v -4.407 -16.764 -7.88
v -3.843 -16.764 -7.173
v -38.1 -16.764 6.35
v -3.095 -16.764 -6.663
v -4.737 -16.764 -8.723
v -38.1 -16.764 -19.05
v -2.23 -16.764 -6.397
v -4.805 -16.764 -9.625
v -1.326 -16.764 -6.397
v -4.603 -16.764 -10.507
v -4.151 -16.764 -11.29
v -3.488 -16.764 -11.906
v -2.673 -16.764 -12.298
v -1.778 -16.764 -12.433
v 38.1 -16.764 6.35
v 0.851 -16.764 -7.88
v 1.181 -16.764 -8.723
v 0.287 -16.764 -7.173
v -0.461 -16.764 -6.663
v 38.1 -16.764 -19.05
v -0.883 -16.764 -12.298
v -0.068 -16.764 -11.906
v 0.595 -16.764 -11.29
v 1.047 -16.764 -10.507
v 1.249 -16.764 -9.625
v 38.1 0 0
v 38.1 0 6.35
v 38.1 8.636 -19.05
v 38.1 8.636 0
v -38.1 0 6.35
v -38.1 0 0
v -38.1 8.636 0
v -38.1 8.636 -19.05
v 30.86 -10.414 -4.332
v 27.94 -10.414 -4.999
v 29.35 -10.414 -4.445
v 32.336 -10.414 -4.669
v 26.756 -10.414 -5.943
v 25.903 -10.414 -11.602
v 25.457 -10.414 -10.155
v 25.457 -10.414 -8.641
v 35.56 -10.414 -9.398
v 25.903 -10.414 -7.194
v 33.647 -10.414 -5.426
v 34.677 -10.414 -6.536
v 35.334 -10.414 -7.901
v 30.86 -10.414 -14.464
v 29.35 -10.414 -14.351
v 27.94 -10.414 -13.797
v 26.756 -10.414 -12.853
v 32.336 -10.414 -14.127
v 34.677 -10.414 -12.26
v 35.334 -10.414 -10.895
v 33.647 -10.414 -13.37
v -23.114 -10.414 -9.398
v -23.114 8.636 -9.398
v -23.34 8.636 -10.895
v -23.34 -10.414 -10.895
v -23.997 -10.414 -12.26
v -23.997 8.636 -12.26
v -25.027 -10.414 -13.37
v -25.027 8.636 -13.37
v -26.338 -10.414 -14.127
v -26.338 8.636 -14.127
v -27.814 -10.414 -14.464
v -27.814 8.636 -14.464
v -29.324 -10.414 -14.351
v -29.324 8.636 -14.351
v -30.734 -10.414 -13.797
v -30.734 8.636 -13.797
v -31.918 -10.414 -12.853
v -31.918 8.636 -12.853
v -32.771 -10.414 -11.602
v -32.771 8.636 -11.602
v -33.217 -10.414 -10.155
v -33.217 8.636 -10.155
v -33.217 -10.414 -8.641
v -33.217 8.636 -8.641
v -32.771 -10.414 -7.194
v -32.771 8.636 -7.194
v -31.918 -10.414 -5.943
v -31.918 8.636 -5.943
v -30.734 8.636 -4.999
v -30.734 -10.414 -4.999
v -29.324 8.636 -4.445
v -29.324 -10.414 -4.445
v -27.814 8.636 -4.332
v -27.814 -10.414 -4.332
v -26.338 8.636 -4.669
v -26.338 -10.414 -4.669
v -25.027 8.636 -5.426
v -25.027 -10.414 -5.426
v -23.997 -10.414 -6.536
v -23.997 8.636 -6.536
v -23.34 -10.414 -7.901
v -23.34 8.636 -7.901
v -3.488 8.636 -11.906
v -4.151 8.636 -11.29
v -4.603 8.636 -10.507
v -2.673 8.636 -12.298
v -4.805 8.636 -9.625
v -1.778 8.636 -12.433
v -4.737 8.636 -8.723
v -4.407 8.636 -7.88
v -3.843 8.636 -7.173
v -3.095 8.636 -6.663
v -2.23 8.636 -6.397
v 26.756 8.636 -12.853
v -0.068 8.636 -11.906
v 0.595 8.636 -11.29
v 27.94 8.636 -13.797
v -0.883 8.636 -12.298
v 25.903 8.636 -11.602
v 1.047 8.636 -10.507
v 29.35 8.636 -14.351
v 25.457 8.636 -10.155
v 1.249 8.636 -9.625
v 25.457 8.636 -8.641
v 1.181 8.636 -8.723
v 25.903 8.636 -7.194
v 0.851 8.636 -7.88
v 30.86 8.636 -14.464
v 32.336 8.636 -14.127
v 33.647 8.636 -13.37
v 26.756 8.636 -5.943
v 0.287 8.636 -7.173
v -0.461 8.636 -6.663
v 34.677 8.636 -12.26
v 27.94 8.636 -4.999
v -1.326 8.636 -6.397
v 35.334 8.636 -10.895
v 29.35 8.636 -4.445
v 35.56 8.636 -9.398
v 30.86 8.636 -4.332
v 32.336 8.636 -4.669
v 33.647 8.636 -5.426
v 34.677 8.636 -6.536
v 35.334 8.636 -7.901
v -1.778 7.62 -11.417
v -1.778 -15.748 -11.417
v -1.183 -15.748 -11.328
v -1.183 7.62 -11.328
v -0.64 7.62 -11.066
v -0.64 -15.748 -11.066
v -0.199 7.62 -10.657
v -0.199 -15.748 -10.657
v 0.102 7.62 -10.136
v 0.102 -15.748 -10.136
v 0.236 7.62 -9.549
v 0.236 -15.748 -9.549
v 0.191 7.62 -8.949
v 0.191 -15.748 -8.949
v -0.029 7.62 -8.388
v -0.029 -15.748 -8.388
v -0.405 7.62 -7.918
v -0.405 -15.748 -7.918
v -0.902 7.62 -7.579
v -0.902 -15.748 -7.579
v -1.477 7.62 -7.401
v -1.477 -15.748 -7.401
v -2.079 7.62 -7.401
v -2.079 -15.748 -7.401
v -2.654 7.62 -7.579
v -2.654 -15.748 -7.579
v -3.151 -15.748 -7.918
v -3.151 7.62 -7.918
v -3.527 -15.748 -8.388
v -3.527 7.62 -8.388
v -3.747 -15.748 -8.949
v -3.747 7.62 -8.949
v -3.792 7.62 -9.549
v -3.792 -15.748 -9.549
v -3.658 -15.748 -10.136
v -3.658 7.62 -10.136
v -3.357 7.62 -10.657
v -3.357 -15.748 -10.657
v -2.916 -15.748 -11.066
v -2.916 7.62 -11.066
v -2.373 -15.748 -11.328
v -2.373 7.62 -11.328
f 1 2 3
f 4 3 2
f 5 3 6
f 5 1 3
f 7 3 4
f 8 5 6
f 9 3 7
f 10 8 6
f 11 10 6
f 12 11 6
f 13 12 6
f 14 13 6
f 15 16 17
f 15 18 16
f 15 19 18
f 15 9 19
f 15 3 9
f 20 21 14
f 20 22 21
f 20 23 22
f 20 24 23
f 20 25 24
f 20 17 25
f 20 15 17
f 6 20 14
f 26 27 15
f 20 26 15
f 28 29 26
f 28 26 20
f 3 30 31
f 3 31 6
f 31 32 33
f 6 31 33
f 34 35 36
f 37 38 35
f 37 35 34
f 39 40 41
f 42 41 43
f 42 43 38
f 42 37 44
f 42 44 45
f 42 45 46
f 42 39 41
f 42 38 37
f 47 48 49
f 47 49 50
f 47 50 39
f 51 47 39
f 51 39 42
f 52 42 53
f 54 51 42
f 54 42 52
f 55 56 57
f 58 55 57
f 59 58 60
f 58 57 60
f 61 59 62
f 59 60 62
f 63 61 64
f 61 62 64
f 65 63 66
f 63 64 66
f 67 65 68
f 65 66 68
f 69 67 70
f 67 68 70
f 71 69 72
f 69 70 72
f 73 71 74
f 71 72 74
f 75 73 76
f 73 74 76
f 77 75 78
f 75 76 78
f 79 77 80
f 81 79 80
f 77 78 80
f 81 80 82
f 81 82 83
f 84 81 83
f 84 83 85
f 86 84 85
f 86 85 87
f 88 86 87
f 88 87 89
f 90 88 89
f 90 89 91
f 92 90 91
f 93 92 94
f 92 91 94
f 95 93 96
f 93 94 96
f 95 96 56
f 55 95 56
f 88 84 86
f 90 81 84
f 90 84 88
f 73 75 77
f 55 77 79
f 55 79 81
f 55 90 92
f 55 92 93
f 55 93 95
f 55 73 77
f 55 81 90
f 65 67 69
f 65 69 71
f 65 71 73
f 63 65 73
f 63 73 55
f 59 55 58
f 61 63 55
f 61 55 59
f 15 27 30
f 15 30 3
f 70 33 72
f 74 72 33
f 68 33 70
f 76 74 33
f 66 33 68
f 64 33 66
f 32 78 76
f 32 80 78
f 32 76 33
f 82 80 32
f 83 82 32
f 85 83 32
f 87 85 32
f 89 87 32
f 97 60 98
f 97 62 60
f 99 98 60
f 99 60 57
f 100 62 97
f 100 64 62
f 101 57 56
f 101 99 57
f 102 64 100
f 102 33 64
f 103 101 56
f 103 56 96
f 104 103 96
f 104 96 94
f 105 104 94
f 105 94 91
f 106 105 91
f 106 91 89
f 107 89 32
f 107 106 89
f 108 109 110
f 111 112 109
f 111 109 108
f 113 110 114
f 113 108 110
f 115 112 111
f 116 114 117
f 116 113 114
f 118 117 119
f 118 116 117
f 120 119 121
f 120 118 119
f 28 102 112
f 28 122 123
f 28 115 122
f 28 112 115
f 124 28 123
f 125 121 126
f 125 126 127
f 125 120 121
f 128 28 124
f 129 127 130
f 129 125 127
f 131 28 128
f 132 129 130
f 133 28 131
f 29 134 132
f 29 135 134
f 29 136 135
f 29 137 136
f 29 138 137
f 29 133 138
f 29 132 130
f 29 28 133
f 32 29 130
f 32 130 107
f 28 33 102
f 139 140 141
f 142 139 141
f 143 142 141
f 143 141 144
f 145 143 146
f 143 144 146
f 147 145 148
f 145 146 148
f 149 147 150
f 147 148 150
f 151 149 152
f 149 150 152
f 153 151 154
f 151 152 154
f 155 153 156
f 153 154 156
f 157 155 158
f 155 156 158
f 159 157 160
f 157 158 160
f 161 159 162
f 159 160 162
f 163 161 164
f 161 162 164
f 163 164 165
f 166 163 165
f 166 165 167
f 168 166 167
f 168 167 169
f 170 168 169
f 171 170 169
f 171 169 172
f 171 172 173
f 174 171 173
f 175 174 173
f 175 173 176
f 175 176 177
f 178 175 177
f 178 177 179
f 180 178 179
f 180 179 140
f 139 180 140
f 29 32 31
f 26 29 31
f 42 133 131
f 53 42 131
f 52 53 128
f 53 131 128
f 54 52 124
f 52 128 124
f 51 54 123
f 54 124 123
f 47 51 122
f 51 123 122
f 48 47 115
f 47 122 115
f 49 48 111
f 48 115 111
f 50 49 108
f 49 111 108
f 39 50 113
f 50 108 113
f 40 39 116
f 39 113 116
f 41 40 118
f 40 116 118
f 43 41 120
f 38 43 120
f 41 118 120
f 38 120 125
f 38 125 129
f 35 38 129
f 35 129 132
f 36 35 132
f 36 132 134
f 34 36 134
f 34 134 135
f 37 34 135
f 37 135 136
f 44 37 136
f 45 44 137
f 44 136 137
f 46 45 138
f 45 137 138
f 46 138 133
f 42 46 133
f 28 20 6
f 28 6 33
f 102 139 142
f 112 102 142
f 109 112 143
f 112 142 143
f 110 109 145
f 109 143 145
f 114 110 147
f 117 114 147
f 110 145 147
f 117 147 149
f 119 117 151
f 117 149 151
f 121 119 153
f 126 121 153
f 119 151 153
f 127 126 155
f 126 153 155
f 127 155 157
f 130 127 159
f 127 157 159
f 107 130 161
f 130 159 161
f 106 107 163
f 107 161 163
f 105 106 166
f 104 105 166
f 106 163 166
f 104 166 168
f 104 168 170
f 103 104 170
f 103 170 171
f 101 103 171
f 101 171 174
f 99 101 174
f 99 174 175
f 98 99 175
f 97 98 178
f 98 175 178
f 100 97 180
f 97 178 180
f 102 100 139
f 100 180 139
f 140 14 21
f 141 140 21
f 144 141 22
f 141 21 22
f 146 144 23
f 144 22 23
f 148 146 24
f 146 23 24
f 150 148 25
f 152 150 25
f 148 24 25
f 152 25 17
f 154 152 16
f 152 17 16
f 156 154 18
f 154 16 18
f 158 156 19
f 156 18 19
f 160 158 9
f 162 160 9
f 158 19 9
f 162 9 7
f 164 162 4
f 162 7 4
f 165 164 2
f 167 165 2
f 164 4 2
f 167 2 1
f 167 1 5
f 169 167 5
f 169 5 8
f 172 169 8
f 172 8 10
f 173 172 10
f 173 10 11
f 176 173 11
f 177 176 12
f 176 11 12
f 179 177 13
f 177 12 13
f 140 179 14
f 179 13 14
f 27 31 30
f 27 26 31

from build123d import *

# Parameters (mm, degrees)
BOSS_EXTRUDE1_DEPTH      = 38.1
BOSS_EXTRUDE1_DEPTH_BACK = 38.1
SKETCH2_R                = 5.08
CUT_EXTRUDE1_DEPTH       = 19.05
F_10_32_TAPPED_HOLE2_D   = 4.0386
CHAMFER5_SIZE            = 1.016
CHAMFER6_SIZE            = 1.016


with BuildPart() as part:
    # Sketch1 → Boss-Extrude1 (new, two sides: drawn at the far end of the back side and taken through both)
    with BuildSketch(Plane(origin=(0, 0, 0), x_dir=(0, 0, -1), z_dir=(1, 0, 0)).offset(-BOSS_EXTRUDE1_DEPTH_BACK)):
        Polygon((0, 0), (-6.35, 0), (-6.35, -16.764), (19.05, -16.764), (19.05, 8.636), (0, 8.636), align=None)
    extrude(amount=BOSS_EXTRUDE1_DEPTH + BOSS_EXTRUDE1_DEPTH_BACK)

    # Sketch2 → Cut-Extrude1 (cut)
    with BuildSketch(Plane(origin=(0, 8.636, 0), x_dir=(1, 0, 0), z_dir=(0, 1, 0))):
        with Locations((-28.194, 9.398)):
            Circle(SKETCH2_R)
        with Locations((30.48, 9.398)):
            Circle(SKETCH2_R)
    extrude(amount=-CUT_EXTRUDE1_DEPTH, mode=Mode.SUBTRACT)

    # #10-32 Tapped Hole2 (through all)
    with Locations(Plane(origin=(-1.778, 8.636, -9.398), x_dir=(0, 0, 1), z_dir=(0, 1, 0))):
        with Locations((0, 0)):
            Hole(F_10_32_TAPPED_HOLE2_D / 2)

    # Chamfer5
    chamfer5_edges = [part.edges().sort_by_distance(p)[0] for p in [
        (-1.778, 8.636, -7.3787),
    ]]
    chamfer(chamfer5_edges, length=CHAMFER5_SIZE)

    # Chamfer6
    chamfer6_edges = [part.edges().sort_by_distance(p)[0] for p in [
        (-1.778, -16.764, -7.3787),
    ]]
    chamfer(chamfer6_edges, length=CHAMFER6_SIZE)


solid = part.part
